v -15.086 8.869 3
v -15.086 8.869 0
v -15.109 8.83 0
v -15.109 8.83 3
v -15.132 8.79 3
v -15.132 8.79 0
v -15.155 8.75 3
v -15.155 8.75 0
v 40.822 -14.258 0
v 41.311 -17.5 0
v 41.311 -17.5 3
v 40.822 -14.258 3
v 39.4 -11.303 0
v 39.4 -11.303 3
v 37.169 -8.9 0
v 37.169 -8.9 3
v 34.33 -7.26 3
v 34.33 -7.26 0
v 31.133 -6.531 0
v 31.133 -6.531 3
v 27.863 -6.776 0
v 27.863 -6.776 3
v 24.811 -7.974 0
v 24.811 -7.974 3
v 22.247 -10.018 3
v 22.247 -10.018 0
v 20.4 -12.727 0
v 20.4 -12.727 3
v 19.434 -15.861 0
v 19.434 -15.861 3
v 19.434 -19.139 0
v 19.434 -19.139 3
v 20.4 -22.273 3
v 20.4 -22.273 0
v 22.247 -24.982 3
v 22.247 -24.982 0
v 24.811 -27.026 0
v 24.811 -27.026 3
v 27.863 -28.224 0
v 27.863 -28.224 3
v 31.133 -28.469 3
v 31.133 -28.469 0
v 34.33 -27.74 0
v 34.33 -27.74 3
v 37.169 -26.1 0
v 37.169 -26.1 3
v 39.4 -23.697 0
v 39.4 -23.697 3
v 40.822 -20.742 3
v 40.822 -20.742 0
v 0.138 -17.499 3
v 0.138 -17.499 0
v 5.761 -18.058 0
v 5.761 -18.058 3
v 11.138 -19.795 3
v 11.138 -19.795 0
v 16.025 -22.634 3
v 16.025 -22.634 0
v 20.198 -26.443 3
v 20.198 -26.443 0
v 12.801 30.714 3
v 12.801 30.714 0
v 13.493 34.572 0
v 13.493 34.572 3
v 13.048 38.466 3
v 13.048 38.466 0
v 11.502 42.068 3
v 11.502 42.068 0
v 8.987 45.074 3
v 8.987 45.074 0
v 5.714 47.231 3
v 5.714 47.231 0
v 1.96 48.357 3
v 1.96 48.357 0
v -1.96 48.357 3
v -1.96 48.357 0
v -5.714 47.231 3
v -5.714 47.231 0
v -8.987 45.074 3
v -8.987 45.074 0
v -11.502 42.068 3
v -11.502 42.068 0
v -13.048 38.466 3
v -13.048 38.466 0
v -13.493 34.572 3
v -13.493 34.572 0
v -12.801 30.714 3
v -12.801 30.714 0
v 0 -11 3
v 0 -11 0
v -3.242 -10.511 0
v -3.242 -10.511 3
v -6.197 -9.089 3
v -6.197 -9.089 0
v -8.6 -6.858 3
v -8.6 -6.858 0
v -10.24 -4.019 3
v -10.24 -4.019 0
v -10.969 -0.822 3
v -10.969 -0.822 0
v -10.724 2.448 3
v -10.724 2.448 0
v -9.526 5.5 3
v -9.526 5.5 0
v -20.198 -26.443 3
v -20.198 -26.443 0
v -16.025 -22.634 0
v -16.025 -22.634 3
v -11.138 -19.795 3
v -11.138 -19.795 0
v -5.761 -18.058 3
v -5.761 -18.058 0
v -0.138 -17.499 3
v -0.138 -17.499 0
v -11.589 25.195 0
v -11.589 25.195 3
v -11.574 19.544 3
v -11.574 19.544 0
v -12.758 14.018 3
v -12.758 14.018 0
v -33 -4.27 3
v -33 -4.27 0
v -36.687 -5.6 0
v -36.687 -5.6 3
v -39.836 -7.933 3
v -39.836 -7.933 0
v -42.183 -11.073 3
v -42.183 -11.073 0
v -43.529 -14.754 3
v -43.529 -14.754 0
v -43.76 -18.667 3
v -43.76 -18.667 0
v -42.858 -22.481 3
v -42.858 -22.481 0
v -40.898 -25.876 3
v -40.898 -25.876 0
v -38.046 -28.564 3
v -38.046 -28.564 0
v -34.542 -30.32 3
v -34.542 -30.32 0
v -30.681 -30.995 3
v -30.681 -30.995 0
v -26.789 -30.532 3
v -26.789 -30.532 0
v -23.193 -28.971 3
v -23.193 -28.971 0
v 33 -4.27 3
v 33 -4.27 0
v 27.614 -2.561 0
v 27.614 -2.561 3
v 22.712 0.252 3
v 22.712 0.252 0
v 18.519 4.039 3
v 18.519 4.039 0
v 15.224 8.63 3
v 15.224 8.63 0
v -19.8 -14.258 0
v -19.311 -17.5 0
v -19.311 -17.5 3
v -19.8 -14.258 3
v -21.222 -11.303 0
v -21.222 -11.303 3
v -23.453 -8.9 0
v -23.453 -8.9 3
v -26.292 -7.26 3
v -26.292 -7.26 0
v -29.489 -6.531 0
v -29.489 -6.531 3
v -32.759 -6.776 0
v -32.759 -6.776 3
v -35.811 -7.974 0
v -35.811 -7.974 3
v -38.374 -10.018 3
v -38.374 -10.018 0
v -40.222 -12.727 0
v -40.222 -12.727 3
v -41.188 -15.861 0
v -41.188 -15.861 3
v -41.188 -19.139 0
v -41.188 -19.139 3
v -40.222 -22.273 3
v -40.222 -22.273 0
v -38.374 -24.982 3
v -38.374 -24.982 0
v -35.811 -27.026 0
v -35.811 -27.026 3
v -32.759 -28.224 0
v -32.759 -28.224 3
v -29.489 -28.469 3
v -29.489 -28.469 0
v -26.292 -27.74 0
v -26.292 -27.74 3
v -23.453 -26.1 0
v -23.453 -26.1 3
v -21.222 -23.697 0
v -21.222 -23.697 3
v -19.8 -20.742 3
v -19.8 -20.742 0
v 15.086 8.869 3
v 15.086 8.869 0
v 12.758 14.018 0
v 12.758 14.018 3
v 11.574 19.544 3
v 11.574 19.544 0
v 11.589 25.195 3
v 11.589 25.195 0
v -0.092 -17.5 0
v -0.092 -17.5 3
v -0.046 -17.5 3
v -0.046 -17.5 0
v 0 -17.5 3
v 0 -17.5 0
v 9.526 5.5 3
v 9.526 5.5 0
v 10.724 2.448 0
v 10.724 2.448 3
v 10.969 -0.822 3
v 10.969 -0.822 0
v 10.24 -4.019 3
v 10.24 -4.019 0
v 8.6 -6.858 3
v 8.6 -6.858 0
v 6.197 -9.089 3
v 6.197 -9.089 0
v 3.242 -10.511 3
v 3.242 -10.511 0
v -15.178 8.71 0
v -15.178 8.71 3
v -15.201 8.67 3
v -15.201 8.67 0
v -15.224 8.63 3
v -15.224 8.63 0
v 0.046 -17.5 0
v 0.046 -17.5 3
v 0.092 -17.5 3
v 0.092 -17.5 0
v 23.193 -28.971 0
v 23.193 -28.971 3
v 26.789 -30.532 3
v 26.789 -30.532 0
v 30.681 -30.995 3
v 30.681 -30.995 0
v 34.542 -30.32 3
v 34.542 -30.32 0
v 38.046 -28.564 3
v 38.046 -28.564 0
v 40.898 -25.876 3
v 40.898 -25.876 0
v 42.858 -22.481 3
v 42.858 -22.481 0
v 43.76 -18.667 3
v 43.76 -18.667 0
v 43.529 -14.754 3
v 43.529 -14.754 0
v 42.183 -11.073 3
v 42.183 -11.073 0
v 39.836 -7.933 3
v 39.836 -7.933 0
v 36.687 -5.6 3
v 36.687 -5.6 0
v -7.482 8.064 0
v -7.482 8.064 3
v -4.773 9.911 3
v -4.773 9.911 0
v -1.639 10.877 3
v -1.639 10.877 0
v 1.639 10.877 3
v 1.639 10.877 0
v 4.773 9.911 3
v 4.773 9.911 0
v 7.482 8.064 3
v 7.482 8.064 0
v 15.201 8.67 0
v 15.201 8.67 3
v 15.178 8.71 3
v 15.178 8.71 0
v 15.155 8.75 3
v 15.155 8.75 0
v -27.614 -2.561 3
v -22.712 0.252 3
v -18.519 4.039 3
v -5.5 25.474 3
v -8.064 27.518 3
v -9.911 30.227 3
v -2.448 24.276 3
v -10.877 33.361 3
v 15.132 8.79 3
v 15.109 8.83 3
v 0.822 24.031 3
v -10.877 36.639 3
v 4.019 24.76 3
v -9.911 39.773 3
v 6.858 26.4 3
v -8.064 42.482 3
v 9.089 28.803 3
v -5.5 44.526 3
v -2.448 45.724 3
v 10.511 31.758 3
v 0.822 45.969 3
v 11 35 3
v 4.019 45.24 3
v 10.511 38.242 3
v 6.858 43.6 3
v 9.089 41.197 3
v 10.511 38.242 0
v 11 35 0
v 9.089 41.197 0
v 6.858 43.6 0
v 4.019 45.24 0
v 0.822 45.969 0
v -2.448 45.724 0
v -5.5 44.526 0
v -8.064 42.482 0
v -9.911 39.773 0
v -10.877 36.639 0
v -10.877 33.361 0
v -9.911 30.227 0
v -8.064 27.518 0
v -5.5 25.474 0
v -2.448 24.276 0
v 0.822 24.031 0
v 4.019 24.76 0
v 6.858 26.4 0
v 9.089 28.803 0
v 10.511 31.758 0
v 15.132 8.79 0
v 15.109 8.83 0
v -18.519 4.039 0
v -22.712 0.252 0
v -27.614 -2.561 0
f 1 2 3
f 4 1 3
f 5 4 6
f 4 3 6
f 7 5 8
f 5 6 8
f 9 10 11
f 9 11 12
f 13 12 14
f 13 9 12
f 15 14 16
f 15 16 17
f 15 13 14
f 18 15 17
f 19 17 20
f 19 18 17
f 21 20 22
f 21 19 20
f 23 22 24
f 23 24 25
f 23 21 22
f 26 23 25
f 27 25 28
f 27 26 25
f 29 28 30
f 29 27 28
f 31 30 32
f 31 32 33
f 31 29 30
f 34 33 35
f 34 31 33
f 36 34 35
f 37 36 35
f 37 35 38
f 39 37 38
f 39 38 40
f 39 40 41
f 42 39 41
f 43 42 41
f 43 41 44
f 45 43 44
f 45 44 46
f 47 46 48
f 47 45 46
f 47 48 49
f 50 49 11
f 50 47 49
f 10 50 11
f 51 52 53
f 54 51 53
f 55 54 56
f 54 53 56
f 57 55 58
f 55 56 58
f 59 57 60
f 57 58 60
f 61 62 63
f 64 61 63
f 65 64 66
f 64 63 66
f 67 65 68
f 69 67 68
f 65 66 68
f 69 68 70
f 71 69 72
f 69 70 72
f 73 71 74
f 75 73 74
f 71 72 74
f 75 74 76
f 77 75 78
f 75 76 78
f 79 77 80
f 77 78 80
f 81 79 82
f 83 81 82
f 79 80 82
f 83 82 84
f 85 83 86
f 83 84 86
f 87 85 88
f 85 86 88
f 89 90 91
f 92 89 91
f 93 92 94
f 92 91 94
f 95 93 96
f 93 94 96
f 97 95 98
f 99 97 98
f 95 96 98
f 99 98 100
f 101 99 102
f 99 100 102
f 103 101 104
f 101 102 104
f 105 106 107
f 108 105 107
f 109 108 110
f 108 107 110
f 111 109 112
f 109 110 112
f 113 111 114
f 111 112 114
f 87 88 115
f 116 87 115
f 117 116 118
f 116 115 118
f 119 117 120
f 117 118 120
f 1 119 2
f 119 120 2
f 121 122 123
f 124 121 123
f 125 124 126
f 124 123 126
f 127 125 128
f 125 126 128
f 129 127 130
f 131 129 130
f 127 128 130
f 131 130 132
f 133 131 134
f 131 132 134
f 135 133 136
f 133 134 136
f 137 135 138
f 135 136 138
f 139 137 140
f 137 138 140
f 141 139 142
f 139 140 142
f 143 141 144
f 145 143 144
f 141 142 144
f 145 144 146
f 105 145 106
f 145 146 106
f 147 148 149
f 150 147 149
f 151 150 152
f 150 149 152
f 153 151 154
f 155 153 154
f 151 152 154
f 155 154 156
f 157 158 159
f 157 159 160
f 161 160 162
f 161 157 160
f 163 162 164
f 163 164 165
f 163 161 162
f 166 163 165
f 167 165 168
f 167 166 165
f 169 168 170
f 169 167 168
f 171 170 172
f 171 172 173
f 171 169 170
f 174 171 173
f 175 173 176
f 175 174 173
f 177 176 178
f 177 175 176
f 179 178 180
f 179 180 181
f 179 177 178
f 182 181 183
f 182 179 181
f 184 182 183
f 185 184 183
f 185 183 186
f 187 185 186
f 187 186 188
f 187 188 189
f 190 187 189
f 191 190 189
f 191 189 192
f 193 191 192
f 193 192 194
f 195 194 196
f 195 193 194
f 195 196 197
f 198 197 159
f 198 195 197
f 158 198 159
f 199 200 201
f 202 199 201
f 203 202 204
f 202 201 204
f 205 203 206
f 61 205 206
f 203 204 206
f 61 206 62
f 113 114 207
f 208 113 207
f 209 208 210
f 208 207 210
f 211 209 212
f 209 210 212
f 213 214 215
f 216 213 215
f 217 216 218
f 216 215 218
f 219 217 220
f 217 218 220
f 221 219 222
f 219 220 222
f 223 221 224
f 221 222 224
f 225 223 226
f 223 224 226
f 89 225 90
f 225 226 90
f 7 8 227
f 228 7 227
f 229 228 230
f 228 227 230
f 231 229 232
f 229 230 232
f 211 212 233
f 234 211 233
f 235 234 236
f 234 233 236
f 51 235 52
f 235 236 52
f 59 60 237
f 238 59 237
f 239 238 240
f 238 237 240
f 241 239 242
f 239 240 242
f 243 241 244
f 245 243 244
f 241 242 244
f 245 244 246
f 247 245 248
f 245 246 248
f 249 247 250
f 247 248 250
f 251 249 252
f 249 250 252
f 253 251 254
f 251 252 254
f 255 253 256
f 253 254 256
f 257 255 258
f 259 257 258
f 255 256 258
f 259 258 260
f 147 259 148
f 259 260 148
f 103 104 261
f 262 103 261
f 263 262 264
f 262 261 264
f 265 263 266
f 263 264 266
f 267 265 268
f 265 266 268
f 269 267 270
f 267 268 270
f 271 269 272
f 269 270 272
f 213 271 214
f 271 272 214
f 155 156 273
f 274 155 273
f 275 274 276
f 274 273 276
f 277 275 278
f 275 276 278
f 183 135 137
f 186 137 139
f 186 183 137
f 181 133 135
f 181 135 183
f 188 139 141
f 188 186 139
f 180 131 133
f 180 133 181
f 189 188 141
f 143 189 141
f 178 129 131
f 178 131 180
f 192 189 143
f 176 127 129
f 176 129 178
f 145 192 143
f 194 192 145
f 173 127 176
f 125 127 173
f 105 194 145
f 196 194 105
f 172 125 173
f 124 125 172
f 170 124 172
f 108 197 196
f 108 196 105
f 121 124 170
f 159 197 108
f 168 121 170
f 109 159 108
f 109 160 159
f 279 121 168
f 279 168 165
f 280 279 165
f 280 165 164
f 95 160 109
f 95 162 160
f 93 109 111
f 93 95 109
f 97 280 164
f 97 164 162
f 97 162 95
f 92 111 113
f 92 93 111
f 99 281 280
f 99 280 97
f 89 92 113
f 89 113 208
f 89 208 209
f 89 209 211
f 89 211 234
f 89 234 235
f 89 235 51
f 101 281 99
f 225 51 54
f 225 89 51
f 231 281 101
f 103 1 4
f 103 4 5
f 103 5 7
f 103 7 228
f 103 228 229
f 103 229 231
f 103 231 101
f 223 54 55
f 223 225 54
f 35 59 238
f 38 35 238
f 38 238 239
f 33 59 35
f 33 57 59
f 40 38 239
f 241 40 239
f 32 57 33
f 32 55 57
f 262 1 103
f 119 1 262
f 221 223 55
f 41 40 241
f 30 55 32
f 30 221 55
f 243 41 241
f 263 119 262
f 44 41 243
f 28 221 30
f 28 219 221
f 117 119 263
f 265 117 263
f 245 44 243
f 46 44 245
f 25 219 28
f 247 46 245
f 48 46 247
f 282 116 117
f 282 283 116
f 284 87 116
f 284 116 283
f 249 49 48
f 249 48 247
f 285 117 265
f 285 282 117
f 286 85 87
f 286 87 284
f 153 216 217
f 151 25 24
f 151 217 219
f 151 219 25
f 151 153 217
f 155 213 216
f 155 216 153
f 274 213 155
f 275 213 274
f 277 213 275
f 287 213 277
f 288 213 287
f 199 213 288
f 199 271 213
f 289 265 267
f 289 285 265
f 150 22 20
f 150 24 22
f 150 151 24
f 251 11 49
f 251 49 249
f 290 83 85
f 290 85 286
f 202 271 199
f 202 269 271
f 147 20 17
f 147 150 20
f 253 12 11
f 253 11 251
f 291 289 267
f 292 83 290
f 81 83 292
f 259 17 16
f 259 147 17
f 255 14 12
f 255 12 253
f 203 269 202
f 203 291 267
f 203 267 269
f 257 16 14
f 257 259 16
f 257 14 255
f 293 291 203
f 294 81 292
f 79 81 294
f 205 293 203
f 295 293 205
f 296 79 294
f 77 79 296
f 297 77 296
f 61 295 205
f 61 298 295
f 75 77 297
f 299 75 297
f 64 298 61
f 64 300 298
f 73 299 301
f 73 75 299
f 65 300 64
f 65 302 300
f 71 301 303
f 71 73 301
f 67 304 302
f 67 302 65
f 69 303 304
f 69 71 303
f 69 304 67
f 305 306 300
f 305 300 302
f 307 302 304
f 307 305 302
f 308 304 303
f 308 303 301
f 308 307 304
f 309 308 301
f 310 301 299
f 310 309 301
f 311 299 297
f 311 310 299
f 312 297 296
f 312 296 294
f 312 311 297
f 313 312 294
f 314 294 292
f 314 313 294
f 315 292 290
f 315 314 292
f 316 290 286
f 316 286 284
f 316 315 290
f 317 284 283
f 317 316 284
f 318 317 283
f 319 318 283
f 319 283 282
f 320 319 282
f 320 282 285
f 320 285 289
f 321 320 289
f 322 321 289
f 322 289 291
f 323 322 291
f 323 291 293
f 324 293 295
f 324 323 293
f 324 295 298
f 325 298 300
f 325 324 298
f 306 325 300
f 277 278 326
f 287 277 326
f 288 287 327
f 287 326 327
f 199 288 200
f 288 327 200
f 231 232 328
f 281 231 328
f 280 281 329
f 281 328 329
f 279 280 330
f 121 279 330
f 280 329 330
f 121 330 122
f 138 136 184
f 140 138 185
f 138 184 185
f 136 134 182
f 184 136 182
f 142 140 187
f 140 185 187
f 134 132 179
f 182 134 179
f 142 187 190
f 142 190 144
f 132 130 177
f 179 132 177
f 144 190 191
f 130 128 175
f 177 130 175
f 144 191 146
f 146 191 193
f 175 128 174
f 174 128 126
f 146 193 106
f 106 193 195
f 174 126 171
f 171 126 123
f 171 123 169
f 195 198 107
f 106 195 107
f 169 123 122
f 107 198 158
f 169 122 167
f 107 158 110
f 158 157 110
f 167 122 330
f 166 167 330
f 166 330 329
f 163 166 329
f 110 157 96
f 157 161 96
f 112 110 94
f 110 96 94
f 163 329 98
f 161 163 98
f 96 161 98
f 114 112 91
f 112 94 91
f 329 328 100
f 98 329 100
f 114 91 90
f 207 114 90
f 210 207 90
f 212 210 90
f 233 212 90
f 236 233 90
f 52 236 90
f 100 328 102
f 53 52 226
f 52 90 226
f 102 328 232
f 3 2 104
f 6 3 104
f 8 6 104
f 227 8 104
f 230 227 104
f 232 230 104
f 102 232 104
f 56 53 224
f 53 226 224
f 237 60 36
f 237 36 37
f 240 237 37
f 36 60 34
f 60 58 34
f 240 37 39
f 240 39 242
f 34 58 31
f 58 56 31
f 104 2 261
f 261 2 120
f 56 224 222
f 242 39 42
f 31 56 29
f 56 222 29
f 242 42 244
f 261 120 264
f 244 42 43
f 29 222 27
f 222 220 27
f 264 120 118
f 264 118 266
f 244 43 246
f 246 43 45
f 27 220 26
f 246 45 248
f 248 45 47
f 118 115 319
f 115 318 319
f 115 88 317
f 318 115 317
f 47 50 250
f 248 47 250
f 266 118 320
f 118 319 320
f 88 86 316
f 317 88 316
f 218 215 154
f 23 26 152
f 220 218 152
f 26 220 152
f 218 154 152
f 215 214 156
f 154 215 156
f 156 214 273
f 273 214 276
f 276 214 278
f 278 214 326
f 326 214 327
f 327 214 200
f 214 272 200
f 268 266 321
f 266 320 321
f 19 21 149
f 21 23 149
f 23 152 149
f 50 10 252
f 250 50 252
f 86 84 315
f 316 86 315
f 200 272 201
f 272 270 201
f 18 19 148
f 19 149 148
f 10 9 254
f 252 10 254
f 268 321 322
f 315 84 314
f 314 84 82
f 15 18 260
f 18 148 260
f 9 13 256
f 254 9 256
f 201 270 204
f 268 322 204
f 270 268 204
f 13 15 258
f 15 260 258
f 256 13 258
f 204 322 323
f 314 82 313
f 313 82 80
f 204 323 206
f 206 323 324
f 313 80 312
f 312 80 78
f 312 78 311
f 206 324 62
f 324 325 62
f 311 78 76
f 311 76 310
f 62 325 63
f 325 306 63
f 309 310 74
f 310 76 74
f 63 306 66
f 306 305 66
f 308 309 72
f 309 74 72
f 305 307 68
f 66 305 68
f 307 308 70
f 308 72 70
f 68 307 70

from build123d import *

# Parameters (mm, degrees)
F0_R     = 11
F1_DEPTH = 3


with BuildPart() as f1:
    # F0 (on Top) → F1 (new body)
    with BuildSketch(Plane.XY):
        with BuildLine():
            ThreePointArc((15.224018, 8.630137), (15.18985, 8.690136), (15.155445, 8.75))
            ThreePointArc((15.155445, 8.75), (15.120804, 8.809728), (15.085927, 8.869318))
            ThreePointArc((15.085927, 8.869318), (11.574062, 19.543722), (12.801487, 30.71375))
            ThreePointArc((12.801487, 30.71375), (0, 48.5), (-12.801487, 30.71375))
            ThreePointArc((-12.801487, 30.71375), (-11.574062, 19.543722), (-15.085927, 8.869318))
            ThreePointArc((-15.085927, 8.869318), (-15.120804, 8.809728), (-15.155445, 8.75))
            ThreePointArc((-15.155445, 8.75), (-15.18985, 8.690136), (-15.224018, 8.630137))
            ThreePointArc((-15.224018, 8.630137), (-22.712391, 0.25157), (-32.999631, -4.270462))
            ThreePointArc((-32.999631, -4.270462), (-42.002232, -24.25), (-20.198144, -26.443288))
            ThreePointArc((-20.198144, -26.443288), (-11.138329, -19.795292), (-0.138091, -17.499455))
            ThreePointArc((-0.138091, -17.499455), (-0.069046, -17.499864), (0, -17.5))
            ThreePointArc((0, -17.5), (0.069046, -17.499864), (0.138091, -17.499455))
            ThreePointArc((0.138091, -17.499455), (11.138329, -19.795292), (20.198144, -26.443288))
            ThreePointArc((20.198144, -26.443288), (42.002232, -24.25), (32.999631, -4.270462))
            ThreePointArc((32.999631, -4.270462), (22.712391, 0.25157), (15.224018, 8.630137))
        make_face()
        with Locations((-30.310889, -17.5)):
            Circle(F0_R, mode=Mode.SUBTRACT)
        with Locations((30.310889, -17.5)):
            Circle(F0_R, mode=Mode.SUBTRACT)
        with BuildLine():
            ThreePointArc((-9.526279, 5.5), (0, 11), (9.526279, 5.5))
            ThreePointArc((9.526279, 5.5), (9.526279, -5.5), (0, -11))
            ThreePointArc((0, -11), (-9.526279, -5.5), (-9.526279, 5.5))
        make_face(mode=Mode.SUBTRACT)
        with Locations((0, 35)):
            Circle(F0_R, mode=Mode.SUBTRACT)
    extrude(amount=F1_DEPTH)


solid = f1.part
